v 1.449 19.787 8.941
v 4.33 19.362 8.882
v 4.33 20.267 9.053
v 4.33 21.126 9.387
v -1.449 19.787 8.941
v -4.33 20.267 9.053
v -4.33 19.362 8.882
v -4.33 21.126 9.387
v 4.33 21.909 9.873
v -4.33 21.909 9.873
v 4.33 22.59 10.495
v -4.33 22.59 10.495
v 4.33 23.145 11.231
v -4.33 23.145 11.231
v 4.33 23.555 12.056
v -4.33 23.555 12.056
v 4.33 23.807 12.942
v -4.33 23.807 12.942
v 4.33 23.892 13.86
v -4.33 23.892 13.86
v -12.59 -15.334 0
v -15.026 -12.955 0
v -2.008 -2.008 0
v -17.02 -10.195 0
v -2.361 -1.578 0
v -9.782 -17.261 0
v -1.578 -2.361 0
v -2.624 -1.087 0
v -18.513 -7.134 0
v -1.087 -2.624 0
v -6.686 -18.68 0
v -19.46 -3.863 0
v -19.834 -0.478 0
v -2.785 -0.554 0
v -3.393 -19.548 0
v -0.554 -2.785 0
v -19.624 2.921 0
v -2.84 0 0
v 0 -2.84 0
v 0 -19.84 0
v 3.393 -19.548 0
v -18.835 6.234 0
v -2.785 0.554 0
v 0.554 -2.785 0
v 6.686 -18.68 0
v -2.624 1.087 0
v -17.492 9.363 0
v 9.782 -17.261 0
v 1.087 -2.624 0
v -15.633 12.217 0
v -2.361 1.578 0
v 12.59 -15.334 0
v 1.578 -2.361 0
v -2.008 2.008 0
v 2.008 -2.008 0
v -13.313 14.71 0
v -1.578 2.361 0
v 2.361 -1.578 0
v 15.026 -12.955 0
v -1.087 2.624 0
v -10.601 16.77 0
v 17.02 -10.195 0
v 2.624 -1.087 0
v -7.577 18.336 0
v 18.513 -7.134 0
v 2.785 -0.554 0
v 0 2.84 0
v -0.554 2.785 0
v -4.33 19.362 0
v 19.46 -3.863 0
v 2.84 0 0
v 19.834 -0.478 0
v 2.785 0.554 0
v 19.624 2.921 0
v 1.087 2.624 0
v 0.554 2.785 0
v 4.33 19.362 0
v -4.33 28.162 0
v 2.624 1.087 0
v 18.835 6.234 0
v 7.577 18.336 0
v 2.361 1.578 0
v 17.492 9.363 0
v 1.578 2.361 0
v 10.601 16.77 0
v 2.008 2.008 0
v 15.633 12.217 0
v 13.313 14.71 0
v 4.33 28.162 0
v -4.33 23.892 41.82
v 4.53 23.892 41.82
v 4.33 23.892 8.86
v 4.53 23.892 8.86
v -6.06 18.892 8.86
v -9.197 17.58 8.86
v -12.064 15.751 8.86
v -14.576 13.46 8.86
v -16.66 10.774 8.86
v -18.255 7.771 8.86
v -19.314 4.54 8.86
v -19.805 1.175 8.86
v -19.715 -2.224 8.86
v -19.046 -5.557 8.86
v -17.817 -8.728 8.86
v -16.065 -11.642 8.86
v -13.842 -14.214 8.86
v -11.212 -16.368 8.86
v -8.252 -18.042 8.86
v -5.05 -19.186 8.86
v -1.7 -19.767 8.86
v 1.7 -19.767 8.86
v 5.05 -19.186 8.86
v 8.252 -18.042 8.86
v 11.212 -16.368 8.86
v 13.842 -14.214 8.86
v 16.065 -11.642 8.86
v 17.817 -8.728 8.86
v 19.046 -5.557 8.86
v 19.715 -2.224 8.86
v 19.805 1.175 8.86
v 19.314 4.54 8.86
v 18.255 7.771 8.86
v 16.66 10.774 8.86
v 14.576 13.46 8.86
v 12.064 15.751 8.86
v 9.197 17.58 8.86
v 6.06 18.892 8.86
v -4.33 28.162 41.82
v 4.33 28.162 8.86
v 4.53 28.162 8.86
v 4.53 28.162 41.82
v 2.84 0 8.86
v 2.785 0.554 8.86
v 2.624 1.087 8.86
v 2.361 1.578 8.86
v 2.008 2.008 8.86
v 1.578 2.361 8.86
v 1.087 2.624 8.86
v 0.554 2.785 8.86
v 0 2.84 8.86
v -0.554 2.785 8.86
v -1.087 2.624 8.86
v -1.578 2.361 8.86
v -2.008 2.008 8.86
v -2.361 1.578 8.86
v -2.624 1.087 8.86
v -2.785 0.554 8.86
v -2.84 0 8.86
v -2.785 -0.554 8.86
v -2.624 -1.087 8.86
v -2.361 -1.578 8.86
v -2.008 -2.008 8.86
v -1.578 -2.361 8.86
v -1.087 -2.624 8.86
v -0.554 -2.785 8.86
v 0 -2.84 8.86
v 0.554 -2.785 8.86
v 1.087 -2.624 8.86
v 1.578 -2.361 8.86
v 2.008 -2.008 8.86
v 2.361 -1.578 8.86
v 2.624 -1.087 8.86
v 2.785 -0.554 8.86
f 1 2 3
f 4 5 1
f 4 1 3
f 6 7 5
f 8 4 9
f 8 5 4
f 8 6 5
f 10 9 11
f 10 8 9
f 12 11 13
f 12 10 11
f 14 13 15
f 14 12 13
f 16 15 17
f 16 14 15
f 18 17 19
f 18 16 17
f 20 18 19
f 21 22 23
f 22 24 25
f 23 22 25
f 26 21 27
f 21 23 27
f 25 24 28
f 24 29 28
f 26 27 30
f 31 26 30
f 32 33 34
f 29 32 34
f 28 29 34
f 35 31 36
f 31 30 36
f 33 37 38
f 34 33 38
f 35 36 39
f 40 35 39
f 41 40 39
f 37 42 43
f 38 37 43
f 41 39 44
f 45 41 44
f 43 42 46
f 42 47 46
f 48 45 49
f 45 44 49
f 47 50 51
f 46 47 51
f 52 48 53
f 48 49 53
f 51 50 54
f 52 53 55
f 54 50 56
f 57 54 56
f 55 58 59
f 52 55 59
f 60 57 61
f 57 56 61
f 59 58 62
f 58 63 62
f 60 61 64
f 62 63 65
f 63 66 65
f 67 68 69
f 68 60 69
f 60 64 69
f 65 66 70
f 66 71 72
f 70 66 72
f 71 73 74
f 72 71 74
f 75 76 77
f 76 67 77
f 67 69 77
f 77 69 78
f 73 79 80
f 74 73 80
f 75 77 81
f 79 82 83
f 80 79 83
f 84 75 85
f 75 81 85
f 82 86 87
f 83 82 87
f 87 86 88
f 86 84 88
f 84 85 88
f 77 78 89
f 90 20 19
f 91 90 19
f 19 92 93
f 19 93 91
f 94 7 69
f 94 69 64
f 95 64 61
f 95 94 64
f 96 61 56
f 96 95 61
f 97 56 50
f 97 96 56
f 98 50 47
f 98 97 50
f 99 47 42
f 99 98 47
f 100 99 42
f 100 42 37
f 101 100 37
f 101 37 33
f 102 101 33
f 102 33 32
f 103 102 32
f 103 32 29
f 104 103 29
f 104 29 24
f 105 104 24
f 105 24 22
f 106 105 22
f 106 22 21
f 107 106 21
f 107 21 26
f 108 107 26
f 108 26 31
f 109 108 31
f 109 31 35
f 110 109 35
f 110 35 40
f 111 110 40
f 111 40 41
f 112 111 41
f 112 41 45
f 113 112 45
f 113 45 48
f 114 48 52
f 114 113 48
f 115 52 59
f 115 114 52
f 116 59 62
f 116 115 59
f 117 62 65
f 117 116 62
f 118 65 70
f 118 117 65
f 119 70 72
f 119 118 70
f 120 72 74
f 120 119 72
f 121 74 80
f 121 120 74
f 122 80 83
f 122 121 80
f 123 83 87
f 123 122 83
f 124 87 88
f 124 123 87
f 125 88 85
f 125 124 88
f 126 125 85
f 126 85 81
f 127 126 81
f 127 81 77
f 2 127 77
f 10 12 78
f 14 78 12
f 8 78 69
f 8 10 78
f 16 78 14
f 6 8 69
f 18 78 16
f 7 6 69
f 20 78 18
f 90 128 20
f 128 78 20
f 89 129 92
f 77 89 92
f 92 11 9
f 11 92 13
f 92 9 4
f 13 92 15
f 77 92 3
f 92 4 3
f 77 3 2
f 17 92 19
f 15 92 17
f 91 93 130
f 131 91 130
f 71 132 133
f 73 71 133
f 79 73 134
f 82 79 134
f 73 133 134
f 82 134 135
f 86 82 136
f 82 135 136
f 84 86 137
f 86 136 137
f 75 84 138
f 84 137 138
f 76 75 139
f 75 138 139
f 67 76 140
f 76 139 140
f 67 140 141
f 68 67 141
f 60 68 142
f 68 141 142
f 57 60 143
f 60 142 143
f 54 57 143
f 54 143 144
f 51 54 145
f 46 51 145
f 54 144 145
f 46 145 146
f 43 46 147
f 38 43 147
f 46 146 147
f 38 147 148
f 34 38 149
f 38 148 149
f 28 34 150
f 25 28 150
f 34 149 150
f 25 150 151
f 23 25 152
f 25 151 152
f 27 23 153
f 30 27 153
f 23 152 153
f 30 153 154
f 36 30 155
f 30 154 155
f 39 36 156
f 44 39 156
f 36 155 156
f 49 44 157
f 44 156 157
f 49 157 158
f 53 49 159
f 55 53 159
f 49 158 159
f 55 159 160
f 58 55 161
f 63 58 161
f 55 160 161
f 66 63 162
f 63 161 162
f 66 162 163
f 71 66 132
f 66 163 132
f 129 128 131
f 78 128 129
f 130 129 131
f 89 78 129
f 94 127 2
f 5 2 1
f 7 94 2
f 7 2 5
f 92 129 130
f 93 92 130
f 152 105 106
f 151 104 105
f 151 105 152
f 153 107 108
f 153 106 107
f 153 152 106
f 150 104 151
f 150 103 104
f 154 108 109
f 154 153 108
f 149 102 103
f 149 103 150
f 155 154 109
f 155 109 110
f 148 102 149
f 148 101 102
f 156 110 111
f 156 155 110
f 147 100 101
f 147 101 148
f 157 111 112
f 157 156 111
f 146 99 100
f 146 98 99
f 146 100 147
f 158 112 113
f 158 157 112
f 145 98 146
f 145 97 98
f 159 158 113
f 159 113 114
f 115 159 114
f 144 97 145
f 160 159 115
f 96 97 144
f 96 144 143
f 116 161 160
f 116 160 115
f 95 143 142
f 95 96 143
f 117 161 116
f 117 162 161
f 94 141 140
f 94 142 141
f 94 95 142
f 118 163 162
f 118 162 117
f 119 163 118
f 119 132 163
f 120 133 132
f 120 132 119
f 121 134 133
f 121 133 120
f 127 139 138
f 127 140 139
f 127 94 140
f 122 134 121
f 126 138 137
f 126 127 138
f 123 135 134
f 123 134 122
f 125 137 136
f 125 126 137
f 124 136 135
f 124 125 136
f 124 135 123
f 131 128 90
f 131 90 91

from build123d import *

# Parameters (mm, degrees)
F0_R        = 19.84
F1_DEPTH    = 8.86
F2_W        = 8.66
F2_H        = 8.8
F3_DEPTH    = 8.86
F4_W        = 8.86
F4_H        = 4.27
F5_DEPTH    = 32.96
F6_R        = 2.84
F7_DEPTH    = 8.86
F8_T1_DEPTH = 8.66
F8_T6_DEPTH = 33.66
F8_S7_R     = 19.84
F8_T8_DEPTH = 19


# Not quite as in the source:
# - a fillet or chamfer that OpenCascade refuses, or shapes differently, is made with other operations: its cross-section is extruded or revolved along the edge and cut away or added


with BuildPart() as f1:
    # F0 (on Top) → F1 (new body)
    with BuildSketch(Plane.XY):
        Circle(F0_R)
    extrude(amount=F1_DEPTH)

    # F2 (on Top) → F3 (join)
    with BuildSketch(Plane.XY):
        with Locations((0, 23.761732877)):
            Rectangle(F2_W, F2_H)
    extrude(amount=F3_DEPTH)

    # F4 (on face) → F5 (join)
    with BuildSketch(Plane.XY.offset(8.86)):
        with Locations((0.1, 26.026732877)):
            Rectangle(F4_W, F4_H)
    extrude(amount=F5_DEPTH)

    # F6 (on face) → F7 (cut, through all)
    with BuildSketch(Plane.XY.offset(8.86)):
        Circle(F6_R)
    extrude(amount=-F7_DEPTH, mode=Mode.SUBTRACT)

    # F8: fillet of radius 5 on 1 edges, made by hand

    # F8_s2 → F8_t1 (join)
    with BuildSketch(Plane.YZ.offset(-4.33)):
        with BuildLine():
            ThreePointArc((18.891732877, 8.86), (22.4272667829, 10.3244660941), (23.891732877, 13.86))
            Line((23.891732877, 13.86), (23.891732877, 8.86))
            Line((23.891732877, 8.86), (18.891732877, 8.86))
        make_face()
    extrude(amount=F8_T1_DEPTH)


with BuildPart() as f8_tool4:
    # F8_s5 → F8_t6 (new body)
    with BuildSketch(Plane.YZ.offset(-16.83)):
        with BuildLine():
            ThreePointArc((18.891732877, 8.86), (22.4272667829, 10.3244660941), (23.891732877, 13.86))
            Line((23.891732877, 13.86), (23.891732877, 8.86))
            Line((23.891732877, 8.86), (18.891732877, 8.86))
        make_face()
    extrude(amount=F8_T6_DEPTH)

    # F8_s7 → F8_t8 (intersect, symmetric)
    with BuildSketch(Plane.XY.offset(11.4)):
        Circle(F8_S7_R)
    extrude(amount=F8_T8_DEPTH, both=True, mode=Mode.INTERSECT)


with BuildPart() as f1_1:
    add(f1.part)

    # F8_t3: union F8_tool4
    add(f8_tool4.part)


solid = f1_1.part
